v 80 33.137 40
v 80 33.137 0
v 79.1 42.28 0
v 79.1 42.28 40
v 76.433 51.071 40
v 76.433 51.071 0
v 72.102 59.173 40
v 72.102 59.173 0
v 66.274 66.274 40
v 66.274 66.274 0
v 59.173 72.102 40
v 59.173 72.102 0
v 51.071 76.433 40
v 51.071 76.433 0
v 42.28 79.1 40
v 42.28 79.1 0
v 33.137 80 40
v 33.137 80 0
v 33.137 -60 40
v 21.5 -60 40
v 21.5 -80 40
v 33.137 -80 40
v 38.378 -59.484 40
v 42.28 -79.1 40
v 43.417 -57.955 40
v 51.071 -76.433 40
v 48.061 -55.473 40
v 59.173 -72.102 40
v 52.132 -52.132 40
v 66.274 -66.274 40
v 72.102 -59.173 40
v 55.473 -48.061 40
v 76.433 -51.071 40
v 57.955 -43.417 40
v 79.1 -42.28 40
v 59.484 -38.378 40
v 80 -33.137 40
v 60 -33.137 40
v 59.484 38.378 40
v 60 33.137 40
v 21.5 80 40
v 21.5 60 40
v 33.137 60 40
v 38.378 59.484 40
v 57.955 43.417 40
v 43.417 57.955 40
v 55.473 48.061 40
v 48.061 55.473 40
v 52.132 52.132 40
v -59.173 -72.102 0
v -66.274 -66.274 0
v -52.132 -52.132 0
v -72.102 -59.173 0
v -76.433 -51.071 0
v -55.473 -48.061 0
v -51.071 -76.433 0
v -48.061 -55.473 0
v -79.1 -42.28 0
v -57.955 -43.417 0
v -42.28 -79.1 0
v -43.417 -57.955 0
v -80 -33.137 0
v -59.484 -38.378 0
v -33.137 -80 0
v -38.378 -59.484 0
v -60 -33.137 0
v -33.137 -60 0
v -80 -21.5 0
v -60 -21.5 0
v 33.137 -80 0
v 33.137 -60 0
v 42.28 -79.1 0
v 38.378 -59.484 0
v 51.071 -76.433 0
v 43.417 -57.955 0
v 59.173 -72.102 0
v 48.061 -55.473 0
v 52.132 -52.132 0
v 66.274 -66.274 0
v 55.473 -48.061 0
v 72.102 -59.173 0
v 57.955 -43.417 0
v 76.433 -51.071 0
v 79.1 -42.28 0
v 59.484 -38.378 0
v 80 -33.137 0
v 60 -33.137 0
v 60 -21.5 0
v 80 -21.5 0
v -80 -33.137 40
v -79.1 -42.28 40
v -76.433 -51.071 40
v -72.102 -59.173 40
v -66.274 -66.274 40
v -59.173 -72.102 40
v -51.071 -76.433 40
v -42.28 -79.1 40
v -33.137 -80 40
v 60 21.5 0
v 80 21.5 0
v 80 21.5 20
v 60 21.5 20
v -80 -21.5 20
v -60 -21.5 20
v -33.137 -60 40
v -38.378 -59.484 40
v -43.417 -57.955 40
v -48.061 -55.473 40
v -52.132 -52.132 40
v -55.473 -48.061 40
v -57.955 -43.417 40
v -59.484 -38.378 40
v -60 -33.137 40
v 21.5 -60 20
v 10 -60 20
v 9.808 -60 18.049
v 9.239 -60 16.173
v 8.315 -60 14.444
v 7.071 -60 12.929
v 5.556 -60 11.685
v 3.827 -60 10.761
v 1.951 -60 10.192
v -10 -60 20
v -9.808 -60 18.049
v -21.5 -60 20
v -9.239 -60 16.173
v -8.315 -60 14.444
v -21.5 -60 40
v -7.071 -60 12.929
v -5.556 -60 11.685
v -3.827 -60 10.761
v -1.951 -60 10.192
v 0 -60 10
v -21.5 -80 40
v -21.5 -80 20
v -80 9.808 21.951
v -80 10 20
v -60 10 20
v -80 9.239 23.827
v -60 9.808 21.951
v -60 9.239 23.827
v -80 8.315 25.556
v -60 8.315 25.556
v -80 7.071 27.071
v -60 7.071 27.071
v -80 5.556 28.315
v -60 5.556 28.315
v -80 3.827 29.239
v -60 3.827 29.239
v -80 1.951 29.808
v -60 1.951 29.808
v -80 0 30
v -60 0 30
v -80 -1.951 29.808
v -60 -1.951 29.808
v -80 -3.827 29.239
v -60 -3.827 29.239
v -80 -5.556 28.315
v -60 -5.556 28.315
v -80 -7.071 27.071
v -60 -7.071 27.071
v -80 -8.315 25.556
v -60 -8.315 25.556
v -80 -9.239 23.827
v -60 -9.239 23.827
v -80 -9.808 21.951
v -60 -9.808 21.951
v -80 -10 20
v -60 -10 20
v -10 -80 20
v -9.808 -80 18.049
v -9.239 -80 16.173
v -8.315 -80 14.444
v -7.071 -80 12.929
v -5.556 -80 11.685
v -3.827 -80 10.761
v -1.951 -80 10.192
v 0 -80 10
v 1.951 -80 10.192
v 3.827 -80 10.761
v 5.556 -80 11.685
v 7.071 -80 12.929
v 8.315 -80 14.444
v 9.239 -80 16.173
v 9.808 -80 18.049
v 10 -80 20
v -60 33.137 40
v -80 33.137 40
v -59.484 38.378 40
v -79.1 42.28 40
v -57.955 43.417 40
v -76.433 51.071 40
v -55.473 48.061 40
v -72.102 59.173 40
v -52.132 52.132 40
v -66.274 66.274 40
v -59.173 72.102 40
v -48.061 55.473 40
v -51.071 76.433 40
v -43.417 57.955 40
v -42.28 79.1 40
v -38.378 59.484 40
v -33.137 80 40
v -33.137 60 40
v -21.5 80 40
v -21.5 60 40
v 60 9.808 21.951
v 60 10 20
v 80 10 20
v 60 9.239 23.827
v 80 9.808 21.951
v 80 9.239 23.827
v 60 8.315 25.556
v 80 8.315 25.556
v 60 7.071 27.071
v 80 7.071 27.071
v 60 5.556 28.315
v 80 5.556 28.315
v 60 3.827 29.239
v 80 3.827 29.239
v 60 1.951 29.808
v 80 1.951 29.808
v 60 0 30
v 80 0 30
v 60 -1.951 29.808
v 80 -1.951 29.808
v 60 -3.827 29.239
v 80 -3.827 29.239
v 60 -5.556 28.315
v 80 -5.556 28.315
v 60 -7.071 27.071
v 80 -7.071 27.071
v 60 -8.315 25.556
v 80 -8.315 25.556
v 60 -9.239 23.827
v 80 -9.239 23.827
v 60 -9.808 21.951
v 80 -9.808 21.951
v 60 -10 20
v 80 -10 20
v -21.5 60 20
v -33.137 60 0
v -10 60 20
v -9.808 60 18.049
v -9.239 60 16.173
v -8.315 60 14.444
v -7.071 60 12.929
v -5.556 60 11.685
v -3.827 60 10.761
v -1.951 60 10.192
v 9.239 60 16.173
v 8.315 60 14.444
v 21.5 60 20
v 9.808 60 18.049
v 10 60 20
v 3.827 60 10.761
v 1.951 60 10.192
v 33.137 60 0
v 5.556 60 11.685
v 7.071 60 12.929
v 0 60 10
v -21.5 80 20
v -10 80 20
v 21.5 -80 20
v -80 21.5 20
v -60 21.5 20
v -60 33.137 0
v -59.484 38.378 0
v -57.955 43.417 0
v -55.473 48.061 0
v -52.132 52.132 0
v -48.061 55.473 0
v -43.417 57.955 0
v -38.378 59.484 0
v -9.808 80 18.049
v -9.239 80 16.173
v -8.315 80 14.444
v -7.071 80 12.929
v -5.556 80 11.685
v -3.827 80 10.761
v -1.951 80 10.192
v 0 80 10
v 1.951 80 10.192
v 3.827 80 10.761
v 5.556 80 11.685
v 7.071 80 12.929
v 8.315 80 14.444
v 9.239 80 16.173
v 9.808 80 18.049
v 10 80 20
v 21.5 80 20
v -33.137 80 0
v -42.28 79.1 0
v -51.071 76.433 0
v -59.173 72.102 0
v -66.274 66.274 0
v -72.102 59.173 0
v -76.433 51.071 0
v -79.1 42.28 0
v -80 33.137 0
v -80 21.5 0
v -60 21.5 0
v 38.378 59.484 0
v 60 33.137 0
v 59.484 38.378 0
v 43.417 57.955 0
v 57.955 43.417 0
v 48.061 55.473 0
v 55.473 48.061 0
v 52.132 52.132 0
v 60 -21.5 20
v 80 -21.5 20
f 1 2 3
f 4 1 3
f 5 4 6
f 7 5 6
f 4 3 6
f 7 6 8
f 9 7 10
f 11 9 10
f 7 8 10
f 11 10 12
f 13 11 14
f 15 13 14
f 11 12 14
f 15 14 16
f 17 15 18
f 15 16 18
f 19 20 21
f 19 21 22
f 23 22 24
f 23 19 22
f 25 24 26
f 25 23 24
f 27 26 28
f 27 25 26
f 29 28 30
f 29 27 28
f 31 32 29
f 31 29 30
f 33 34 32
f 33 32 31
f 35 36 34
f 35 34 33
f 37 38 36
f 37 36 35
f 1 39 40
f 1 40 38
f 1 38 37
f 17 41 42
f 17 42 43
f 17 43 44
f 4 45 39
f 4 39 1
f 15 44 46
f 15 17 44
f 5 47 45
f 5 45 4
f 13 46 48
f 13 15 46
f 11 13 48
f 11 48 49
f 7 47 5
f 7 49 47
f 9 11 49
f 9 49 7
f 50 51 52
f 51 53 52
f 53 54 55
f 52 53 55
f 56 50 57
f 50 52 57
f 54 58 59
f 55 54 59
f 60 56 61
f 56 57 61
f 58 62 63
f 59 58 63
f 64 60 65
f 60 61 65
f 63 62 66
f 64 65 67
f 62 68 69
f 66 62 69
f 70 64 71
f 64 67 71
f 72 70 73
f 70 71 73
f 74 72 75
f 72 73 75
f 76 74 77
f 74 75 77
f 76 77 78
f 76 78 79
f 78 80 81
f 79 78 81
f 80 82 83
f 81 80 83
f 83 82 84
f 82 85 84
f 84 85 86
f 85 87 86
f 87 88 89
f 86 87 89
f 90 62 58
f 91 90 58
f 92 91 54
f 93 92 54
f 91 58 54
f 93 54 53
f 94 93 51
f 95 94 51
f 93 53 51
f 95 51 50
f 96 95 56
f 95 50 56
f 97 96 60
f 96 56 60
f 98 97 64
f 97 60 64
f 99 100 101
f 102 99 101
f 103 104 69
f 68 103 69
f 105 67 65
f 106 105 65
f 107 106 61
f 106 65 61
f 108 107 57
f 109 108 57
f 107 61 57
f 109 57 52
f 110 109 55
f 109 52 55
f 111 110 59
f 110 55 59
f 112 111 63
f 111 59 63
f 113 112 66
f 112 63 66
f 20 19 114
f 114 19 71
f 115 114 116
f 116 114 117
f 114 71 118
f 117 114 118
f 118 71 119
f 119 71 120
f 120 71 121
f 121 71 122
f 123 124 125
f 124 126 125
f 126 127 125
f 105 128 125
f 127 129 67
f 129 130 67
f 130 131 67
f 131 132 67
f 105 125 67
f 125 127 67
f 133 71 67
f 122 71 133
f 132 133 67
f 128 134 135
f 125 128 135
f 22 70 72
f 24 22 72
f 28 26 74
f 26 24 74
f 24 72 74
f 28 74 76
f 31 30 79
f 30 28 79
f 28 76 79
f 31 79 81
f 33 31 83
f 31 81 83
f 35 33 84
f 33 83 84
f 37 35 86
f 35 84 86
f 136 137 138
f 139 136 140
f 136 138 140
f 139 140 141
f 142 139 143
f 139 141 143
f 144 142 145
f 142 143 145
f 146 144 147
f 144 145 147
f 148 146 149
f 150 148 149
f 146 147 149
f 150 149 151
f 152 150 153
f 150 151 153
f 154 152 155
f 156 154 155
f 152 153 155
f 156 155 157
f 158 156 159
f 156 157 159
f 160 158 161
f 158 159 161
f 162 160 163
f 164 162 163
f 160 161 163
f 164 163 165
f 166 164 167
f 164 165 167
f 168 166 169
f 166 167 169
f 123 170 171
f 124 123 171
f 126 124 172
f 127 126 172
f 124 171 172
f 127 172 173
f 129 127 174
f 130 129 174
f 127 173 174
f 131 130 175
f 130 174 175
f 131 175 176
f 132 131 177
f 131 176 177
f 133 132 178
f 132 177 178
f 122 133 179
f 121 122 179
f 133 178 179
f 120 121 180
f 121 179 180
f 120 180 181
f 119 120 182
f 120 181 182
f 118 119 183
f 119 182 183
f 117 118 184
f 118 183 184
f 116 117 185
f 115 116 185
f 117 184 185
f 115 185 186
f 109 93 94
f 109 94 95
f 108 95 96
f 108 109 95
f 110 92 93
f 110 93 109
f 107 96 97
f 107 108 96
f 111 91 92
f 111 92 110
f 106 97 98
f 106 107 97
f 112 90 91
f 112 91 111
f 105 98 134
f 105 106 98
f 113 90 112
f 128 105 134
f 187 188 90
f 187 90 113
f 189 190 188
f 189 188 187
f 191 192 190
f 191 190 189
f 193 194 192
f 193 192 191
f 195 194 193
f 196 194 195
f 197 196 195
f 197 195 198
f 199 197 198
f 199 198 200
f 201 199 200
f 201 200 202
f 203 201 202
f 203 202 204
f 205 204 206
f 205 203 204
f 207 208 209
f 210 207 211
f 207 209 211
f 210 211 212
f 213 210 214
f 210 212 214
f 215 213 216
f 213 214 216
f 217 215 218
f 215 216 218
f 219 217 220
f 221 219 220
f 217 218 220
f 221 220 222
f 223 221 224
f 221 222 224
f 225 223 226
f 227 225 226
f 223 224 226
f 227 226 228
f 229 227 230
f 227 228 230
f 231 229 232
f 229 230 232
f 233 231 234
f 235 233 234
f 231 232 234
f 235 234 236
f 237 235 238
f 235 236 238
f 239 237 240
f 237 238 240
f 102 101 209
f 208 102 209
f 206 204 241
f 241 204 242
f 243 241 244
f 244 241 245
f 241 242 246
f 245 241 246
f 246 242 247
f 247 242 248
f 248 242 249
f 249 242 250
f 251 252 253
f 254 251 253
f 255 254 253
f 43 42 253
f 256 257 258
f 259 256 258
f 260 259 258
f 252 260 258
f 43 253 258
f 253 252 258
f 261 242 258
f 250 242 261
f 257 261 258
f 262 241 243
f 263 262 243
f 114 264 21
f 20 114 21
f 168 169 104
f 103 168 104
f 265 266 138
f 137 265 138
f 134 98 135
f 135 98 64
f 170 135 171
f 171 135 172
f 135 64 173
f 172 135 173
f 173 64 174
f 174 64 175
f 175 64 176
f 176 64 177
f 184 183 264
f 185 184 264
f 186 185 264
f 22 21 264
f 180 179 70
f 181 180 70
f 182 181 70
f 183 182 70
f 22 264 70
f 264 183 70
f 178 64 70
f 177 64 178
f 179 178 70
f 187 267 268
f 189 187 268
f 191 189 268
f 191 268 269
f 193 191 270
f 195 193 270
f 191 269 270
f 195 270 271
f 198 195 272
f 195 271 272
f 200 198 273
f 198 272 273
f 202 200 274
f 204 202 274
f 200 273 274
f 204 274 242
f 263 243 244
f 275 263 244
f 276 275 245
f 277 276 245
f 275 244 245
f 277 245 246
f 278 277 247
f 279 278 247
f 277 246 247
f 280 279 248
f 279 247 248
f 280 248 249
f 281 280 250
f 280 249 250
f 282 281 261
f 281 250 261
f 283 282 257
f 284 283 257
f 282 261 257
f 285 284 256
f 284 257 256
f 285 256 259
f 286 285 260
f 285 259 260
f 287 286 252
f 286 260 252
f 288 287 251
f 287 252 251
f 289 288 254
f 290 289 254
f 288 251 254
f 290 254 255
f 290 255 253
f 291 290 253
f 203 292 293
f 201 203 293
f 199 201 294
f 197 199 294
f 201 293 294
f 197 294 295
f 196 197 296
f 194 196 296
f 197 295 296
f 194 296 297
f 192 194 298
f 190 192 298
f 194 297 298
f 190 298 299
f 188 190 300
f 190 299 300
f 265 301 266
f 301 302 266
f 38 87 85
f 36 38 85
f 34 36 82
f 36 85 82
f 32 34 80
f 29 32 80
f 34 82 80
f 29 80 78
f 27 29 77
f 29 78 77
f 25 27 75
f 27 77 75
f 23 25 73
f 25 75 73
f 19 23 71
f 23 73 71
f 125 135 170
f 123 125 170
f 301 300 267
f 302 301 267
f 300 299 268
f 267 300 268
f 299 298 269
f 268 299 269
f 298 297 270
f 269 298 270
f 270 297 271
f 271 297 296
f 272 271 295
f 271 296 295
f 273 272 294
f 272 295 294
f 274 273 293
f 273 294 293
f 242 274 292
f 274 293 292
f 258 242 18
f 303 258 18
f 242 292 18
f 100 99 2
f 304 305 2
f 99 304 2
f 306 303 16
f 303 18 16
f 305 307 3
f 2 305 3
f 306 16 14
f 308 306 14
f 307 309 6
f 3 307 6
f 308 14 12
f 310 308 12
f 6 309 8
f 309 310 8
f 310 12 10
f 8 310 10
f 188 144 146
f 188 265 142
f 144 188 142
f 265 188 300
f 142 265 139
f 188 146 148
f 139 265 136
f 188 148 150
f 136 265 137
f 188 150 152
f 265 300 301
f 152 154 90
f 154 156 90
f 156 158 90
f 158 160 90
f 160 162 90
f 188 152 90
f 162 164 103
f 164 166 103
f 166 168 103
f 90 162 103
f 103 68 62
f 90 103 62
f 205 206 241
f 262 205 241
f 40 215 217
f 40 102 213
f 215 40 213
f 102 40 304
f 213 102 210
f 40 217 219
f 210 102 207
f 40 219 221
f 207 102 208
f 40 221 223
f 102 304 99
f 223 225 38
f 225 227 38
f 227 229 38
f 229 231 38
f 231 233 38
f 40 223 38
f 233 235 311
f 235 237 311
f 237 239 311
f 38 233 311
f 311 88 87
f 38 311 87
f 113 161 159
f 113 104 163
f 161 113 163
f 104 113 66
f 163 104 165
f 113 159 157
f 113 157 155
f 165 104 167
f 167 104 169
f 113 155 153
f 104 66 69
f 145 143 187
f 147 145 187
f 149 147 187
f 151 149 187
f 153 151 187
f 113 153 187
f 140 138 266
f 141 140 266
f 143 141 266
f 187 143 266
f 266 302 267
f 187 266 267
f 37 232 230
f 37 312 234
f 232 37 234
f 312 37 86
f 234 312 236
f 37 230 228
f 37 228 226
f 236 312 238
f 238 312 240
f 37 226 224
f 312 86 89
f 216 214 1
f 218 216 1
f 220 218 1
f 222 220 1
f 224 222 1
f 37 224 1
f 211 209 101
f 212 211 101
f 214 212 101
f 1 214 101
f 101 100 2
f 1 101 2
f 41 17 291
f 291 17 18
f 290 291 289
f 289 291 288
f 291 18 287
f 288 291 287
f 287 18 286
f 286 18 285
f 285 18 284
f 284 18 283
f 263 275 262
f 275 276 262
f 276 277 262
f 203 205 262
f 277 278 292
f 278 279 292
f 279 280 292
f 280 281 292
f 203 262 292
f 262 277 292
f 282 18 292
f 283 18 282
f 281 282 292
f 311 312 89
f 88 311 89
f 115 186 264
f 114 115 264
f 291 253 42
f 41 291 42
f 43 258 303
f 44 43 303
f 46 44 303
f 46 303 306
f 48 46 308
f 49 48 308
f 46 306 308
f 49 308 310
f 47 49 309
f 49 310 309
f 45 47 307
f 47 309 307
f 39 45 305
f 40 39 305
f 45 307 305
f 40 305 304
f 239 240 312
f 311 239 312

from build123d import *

# Parameters (mm, degrees)
F1_DEPTH      = 40
F2_R          = 10
F3_DEPTH      = 180
F3_DEPTH_BACK = 20
F4_R          = 10
F5_DEPTH      = 20
F5_DEPTH_BACK = 180
F7_DEPTH      = 181.4
F9_DEPTH      = 244.2


# Not quite as in the source:
# - a feature names something its author has since deleted; it is built from what else it names


with BuildPart() as f1:
    # F0 (on Top) → F1 (new body)
    with BuildSketch(Plane.XY):
        with BuildLine():
            Line((-33.1370849898, -80), (33.1370849898, -80))
            ThreePointArc((33.1370849898, -80), (66.2741699797, -66.2741699797), (80, -33.1370849898))
            Line((80, -33.1370849898), (80, 33.1370849898))
            ThreePointArc((80, 33.1370849898), (66.2741699797, 66.2741699797), (33.1370849898, 80))
            Line((33.1370849898, 80), (-33.1370849898, 80))
            ThreePointArc((-33.1370849898, 80), (-66.2741699797, 66.2741699797), (-80, 33.1370849898))
            Line((-80, 33.1370849898), (-80, -33.1370849898))
            ThreePointArc((-80, -33.1370849898), (-66.2741699797, -66.2741699797), (-33.1370849898, -80))
        make_face()
        with BuildLine():
            Line((33.1370849898, -60), (24.8528137424, -60))
            Line((24.8528137424, -60), (-24.8528137424, -60))
            Line((-24.8528137424, -60), (-33.1370849898, -60))
            ThreePointArc((-33.1370849898, -60), (-52.132034356, -52.132034356), (-60, -33.1370849898))
            Line((-60, -33.1370849898), (-60, -24.8528137424))
            Line((-60, -24.8528137424), (-60, 24.8528137424))
            Line((-60, 24.8528137424), (-60, 33.1370849898))
            ThreePointArc((-60, 33.1370849898), (-52.132034356, 52.132034356), (-33.1370849898, 60))
            Line((-33.1370849898, 60), (-24.8528137424, 60))
            Line((-24.8528137424, 60), (24.8528137424, 60))
            Line((24.8528137424, 60), (33.1370849898, 60))
            ThreePointArc((33.1370849898, 60), (52.132034356, 52.132034356), (60, 33.1370849898))
            Line((60, 33.1370849898), (60, 24.8528137424))
            Line((60, 24.8528137424), (60, -24.8528137424))
            Line((60, -24.8528137424), (60, -33.1370849898))
            ThreePointArc((60, -33.1370849898), (52.132034356, -52.132034356), (33.1370849898, -60))
        make_face(mode=Mode.SUBTRACT)
    extrude(amount=F1_DEPTH)

    # F2 (on face) → F3 (cut, two sides)
    with BuildSketch(Plane.XZ.offset(80)) as f3_sk:
        with Locations((0, 20)):
            Circle(F2_R)
    extrude(amount=-F3_DEPTH, mode=Mode.SUBTRACT)
    extrude(f3_sk.sketch, amount=F3_DEPTH_BACK, mode=Mode.SUBTRACT)

    # F4 (on face) → F5 (cut, two sides)
    with BuildSketch(Plane.YZ.offset(80)) as f5_sk:
        with Locations((0, 20)):
            Circle(F4_R)
    extrude(amount=F5_DEPTH, mode=Mode.SUBTRACT)
    extrude(f5_sk.sketch, amount=-F5_DEPTH_BACK, mode=Mode.SUBTRACT)

    # F6 (on face) → F7 (cut)
    with BuildSketch(Plane.XZ.offset(80)):
        Polygon((-21.5, 40), (0, 40), (0, 51.6958795488), (-57.5, 51.6958795488), (-71.9271823764, 52.9654417948), (-71.9271823764, 40), (-59.4264046908, 40), (-33.1370849898, 40), align=None)
        with BuildLine():
            Line((0, 40), (0, 30))
            ThreePointArc((0, 30), (7.0710678119, 27.0710678119), (10, 20))
            Line((10, 20), (21.5, 20))
            Line((21.5, 20), (21.5, 33))
            Line((21.5, 33), (21.5, 40))
            Line((21.5, 40), (0, 40))
        make_face()
        Polygon((0, 51.6958795488), (0, 40), (21.5, 40), (21.5, 45.9314808249), (59.4264046908, 40), (71.9271823764, 40), (71.9271823764, 52.9654417948), (57.5, 51.6958795488), align=None)
        with BuildLine():
            Line((-21.5, 20), (-10, 20))
            ThreePointArc((-10, 20), (-7.0710678119, 27.0710678119), (0, 30))
            Line((0, 30), (0, 40))
            Line((0, 40), (-21.5, 40))
            Line((-21.5, 40), (-21.5, 33))
            Line((-21.5, 33), (-21.5, 20))
        make_face()
    extrude(amount=-F7_DEPTH, mode=Mode.SUBTRACT)

    # F8 (on face) → F9 (cut)
    with BuildSketch(Plane.YZ.offset(80)):
        Polygon((21.5, 0), (0, 0), (0, -11.1064584926), (57.5, -11.1064584926), (66.6687613726, -11.8878306821), (66.6687613726, 0), (59.4264046908, 0), (21.5, -5.7359817438), align=None)
        with BuildLine():
            ThreePointArc((10, 20), (7.0710678119, 12.9289321881), (0, 10))
            Line((0, 10), (0, 0))
            Line((0, 0), (21.5, 0))
            Line((21.5, 0), (21.5, 7))
            Line((21.5, 7), (21.5, 20))
            Line((21.5, 20), (10, 20))
        make_face()
        with BuildLine():
            ThreePointArc((0, 10), (-7.0710678119, 12.9289321881), (-10, 20))
            Line((-10, 20), (-21.5, 20))
            Line((-21.5, 20), (-21.5, 7))
            Line((-21.5, 7), (-21.5, 0))
            Line((-21.5, 0), (0, 0))
            Line((0, 0), (0, 10))
        make_face()
        Polygon((0, -11.1064584926), (0, 0), (-21.5, 0), (-21.5, -3.4078599419), (-59.4264046908, 0), (-66.6687613726, 0), (-66.6687613726, -11.8878306821), (-57.5, -11.1064584926), align=None)
    extrude(amount=-F9_DEPTH, mode=Mode.SUBTRACT)


solid = f1.part
